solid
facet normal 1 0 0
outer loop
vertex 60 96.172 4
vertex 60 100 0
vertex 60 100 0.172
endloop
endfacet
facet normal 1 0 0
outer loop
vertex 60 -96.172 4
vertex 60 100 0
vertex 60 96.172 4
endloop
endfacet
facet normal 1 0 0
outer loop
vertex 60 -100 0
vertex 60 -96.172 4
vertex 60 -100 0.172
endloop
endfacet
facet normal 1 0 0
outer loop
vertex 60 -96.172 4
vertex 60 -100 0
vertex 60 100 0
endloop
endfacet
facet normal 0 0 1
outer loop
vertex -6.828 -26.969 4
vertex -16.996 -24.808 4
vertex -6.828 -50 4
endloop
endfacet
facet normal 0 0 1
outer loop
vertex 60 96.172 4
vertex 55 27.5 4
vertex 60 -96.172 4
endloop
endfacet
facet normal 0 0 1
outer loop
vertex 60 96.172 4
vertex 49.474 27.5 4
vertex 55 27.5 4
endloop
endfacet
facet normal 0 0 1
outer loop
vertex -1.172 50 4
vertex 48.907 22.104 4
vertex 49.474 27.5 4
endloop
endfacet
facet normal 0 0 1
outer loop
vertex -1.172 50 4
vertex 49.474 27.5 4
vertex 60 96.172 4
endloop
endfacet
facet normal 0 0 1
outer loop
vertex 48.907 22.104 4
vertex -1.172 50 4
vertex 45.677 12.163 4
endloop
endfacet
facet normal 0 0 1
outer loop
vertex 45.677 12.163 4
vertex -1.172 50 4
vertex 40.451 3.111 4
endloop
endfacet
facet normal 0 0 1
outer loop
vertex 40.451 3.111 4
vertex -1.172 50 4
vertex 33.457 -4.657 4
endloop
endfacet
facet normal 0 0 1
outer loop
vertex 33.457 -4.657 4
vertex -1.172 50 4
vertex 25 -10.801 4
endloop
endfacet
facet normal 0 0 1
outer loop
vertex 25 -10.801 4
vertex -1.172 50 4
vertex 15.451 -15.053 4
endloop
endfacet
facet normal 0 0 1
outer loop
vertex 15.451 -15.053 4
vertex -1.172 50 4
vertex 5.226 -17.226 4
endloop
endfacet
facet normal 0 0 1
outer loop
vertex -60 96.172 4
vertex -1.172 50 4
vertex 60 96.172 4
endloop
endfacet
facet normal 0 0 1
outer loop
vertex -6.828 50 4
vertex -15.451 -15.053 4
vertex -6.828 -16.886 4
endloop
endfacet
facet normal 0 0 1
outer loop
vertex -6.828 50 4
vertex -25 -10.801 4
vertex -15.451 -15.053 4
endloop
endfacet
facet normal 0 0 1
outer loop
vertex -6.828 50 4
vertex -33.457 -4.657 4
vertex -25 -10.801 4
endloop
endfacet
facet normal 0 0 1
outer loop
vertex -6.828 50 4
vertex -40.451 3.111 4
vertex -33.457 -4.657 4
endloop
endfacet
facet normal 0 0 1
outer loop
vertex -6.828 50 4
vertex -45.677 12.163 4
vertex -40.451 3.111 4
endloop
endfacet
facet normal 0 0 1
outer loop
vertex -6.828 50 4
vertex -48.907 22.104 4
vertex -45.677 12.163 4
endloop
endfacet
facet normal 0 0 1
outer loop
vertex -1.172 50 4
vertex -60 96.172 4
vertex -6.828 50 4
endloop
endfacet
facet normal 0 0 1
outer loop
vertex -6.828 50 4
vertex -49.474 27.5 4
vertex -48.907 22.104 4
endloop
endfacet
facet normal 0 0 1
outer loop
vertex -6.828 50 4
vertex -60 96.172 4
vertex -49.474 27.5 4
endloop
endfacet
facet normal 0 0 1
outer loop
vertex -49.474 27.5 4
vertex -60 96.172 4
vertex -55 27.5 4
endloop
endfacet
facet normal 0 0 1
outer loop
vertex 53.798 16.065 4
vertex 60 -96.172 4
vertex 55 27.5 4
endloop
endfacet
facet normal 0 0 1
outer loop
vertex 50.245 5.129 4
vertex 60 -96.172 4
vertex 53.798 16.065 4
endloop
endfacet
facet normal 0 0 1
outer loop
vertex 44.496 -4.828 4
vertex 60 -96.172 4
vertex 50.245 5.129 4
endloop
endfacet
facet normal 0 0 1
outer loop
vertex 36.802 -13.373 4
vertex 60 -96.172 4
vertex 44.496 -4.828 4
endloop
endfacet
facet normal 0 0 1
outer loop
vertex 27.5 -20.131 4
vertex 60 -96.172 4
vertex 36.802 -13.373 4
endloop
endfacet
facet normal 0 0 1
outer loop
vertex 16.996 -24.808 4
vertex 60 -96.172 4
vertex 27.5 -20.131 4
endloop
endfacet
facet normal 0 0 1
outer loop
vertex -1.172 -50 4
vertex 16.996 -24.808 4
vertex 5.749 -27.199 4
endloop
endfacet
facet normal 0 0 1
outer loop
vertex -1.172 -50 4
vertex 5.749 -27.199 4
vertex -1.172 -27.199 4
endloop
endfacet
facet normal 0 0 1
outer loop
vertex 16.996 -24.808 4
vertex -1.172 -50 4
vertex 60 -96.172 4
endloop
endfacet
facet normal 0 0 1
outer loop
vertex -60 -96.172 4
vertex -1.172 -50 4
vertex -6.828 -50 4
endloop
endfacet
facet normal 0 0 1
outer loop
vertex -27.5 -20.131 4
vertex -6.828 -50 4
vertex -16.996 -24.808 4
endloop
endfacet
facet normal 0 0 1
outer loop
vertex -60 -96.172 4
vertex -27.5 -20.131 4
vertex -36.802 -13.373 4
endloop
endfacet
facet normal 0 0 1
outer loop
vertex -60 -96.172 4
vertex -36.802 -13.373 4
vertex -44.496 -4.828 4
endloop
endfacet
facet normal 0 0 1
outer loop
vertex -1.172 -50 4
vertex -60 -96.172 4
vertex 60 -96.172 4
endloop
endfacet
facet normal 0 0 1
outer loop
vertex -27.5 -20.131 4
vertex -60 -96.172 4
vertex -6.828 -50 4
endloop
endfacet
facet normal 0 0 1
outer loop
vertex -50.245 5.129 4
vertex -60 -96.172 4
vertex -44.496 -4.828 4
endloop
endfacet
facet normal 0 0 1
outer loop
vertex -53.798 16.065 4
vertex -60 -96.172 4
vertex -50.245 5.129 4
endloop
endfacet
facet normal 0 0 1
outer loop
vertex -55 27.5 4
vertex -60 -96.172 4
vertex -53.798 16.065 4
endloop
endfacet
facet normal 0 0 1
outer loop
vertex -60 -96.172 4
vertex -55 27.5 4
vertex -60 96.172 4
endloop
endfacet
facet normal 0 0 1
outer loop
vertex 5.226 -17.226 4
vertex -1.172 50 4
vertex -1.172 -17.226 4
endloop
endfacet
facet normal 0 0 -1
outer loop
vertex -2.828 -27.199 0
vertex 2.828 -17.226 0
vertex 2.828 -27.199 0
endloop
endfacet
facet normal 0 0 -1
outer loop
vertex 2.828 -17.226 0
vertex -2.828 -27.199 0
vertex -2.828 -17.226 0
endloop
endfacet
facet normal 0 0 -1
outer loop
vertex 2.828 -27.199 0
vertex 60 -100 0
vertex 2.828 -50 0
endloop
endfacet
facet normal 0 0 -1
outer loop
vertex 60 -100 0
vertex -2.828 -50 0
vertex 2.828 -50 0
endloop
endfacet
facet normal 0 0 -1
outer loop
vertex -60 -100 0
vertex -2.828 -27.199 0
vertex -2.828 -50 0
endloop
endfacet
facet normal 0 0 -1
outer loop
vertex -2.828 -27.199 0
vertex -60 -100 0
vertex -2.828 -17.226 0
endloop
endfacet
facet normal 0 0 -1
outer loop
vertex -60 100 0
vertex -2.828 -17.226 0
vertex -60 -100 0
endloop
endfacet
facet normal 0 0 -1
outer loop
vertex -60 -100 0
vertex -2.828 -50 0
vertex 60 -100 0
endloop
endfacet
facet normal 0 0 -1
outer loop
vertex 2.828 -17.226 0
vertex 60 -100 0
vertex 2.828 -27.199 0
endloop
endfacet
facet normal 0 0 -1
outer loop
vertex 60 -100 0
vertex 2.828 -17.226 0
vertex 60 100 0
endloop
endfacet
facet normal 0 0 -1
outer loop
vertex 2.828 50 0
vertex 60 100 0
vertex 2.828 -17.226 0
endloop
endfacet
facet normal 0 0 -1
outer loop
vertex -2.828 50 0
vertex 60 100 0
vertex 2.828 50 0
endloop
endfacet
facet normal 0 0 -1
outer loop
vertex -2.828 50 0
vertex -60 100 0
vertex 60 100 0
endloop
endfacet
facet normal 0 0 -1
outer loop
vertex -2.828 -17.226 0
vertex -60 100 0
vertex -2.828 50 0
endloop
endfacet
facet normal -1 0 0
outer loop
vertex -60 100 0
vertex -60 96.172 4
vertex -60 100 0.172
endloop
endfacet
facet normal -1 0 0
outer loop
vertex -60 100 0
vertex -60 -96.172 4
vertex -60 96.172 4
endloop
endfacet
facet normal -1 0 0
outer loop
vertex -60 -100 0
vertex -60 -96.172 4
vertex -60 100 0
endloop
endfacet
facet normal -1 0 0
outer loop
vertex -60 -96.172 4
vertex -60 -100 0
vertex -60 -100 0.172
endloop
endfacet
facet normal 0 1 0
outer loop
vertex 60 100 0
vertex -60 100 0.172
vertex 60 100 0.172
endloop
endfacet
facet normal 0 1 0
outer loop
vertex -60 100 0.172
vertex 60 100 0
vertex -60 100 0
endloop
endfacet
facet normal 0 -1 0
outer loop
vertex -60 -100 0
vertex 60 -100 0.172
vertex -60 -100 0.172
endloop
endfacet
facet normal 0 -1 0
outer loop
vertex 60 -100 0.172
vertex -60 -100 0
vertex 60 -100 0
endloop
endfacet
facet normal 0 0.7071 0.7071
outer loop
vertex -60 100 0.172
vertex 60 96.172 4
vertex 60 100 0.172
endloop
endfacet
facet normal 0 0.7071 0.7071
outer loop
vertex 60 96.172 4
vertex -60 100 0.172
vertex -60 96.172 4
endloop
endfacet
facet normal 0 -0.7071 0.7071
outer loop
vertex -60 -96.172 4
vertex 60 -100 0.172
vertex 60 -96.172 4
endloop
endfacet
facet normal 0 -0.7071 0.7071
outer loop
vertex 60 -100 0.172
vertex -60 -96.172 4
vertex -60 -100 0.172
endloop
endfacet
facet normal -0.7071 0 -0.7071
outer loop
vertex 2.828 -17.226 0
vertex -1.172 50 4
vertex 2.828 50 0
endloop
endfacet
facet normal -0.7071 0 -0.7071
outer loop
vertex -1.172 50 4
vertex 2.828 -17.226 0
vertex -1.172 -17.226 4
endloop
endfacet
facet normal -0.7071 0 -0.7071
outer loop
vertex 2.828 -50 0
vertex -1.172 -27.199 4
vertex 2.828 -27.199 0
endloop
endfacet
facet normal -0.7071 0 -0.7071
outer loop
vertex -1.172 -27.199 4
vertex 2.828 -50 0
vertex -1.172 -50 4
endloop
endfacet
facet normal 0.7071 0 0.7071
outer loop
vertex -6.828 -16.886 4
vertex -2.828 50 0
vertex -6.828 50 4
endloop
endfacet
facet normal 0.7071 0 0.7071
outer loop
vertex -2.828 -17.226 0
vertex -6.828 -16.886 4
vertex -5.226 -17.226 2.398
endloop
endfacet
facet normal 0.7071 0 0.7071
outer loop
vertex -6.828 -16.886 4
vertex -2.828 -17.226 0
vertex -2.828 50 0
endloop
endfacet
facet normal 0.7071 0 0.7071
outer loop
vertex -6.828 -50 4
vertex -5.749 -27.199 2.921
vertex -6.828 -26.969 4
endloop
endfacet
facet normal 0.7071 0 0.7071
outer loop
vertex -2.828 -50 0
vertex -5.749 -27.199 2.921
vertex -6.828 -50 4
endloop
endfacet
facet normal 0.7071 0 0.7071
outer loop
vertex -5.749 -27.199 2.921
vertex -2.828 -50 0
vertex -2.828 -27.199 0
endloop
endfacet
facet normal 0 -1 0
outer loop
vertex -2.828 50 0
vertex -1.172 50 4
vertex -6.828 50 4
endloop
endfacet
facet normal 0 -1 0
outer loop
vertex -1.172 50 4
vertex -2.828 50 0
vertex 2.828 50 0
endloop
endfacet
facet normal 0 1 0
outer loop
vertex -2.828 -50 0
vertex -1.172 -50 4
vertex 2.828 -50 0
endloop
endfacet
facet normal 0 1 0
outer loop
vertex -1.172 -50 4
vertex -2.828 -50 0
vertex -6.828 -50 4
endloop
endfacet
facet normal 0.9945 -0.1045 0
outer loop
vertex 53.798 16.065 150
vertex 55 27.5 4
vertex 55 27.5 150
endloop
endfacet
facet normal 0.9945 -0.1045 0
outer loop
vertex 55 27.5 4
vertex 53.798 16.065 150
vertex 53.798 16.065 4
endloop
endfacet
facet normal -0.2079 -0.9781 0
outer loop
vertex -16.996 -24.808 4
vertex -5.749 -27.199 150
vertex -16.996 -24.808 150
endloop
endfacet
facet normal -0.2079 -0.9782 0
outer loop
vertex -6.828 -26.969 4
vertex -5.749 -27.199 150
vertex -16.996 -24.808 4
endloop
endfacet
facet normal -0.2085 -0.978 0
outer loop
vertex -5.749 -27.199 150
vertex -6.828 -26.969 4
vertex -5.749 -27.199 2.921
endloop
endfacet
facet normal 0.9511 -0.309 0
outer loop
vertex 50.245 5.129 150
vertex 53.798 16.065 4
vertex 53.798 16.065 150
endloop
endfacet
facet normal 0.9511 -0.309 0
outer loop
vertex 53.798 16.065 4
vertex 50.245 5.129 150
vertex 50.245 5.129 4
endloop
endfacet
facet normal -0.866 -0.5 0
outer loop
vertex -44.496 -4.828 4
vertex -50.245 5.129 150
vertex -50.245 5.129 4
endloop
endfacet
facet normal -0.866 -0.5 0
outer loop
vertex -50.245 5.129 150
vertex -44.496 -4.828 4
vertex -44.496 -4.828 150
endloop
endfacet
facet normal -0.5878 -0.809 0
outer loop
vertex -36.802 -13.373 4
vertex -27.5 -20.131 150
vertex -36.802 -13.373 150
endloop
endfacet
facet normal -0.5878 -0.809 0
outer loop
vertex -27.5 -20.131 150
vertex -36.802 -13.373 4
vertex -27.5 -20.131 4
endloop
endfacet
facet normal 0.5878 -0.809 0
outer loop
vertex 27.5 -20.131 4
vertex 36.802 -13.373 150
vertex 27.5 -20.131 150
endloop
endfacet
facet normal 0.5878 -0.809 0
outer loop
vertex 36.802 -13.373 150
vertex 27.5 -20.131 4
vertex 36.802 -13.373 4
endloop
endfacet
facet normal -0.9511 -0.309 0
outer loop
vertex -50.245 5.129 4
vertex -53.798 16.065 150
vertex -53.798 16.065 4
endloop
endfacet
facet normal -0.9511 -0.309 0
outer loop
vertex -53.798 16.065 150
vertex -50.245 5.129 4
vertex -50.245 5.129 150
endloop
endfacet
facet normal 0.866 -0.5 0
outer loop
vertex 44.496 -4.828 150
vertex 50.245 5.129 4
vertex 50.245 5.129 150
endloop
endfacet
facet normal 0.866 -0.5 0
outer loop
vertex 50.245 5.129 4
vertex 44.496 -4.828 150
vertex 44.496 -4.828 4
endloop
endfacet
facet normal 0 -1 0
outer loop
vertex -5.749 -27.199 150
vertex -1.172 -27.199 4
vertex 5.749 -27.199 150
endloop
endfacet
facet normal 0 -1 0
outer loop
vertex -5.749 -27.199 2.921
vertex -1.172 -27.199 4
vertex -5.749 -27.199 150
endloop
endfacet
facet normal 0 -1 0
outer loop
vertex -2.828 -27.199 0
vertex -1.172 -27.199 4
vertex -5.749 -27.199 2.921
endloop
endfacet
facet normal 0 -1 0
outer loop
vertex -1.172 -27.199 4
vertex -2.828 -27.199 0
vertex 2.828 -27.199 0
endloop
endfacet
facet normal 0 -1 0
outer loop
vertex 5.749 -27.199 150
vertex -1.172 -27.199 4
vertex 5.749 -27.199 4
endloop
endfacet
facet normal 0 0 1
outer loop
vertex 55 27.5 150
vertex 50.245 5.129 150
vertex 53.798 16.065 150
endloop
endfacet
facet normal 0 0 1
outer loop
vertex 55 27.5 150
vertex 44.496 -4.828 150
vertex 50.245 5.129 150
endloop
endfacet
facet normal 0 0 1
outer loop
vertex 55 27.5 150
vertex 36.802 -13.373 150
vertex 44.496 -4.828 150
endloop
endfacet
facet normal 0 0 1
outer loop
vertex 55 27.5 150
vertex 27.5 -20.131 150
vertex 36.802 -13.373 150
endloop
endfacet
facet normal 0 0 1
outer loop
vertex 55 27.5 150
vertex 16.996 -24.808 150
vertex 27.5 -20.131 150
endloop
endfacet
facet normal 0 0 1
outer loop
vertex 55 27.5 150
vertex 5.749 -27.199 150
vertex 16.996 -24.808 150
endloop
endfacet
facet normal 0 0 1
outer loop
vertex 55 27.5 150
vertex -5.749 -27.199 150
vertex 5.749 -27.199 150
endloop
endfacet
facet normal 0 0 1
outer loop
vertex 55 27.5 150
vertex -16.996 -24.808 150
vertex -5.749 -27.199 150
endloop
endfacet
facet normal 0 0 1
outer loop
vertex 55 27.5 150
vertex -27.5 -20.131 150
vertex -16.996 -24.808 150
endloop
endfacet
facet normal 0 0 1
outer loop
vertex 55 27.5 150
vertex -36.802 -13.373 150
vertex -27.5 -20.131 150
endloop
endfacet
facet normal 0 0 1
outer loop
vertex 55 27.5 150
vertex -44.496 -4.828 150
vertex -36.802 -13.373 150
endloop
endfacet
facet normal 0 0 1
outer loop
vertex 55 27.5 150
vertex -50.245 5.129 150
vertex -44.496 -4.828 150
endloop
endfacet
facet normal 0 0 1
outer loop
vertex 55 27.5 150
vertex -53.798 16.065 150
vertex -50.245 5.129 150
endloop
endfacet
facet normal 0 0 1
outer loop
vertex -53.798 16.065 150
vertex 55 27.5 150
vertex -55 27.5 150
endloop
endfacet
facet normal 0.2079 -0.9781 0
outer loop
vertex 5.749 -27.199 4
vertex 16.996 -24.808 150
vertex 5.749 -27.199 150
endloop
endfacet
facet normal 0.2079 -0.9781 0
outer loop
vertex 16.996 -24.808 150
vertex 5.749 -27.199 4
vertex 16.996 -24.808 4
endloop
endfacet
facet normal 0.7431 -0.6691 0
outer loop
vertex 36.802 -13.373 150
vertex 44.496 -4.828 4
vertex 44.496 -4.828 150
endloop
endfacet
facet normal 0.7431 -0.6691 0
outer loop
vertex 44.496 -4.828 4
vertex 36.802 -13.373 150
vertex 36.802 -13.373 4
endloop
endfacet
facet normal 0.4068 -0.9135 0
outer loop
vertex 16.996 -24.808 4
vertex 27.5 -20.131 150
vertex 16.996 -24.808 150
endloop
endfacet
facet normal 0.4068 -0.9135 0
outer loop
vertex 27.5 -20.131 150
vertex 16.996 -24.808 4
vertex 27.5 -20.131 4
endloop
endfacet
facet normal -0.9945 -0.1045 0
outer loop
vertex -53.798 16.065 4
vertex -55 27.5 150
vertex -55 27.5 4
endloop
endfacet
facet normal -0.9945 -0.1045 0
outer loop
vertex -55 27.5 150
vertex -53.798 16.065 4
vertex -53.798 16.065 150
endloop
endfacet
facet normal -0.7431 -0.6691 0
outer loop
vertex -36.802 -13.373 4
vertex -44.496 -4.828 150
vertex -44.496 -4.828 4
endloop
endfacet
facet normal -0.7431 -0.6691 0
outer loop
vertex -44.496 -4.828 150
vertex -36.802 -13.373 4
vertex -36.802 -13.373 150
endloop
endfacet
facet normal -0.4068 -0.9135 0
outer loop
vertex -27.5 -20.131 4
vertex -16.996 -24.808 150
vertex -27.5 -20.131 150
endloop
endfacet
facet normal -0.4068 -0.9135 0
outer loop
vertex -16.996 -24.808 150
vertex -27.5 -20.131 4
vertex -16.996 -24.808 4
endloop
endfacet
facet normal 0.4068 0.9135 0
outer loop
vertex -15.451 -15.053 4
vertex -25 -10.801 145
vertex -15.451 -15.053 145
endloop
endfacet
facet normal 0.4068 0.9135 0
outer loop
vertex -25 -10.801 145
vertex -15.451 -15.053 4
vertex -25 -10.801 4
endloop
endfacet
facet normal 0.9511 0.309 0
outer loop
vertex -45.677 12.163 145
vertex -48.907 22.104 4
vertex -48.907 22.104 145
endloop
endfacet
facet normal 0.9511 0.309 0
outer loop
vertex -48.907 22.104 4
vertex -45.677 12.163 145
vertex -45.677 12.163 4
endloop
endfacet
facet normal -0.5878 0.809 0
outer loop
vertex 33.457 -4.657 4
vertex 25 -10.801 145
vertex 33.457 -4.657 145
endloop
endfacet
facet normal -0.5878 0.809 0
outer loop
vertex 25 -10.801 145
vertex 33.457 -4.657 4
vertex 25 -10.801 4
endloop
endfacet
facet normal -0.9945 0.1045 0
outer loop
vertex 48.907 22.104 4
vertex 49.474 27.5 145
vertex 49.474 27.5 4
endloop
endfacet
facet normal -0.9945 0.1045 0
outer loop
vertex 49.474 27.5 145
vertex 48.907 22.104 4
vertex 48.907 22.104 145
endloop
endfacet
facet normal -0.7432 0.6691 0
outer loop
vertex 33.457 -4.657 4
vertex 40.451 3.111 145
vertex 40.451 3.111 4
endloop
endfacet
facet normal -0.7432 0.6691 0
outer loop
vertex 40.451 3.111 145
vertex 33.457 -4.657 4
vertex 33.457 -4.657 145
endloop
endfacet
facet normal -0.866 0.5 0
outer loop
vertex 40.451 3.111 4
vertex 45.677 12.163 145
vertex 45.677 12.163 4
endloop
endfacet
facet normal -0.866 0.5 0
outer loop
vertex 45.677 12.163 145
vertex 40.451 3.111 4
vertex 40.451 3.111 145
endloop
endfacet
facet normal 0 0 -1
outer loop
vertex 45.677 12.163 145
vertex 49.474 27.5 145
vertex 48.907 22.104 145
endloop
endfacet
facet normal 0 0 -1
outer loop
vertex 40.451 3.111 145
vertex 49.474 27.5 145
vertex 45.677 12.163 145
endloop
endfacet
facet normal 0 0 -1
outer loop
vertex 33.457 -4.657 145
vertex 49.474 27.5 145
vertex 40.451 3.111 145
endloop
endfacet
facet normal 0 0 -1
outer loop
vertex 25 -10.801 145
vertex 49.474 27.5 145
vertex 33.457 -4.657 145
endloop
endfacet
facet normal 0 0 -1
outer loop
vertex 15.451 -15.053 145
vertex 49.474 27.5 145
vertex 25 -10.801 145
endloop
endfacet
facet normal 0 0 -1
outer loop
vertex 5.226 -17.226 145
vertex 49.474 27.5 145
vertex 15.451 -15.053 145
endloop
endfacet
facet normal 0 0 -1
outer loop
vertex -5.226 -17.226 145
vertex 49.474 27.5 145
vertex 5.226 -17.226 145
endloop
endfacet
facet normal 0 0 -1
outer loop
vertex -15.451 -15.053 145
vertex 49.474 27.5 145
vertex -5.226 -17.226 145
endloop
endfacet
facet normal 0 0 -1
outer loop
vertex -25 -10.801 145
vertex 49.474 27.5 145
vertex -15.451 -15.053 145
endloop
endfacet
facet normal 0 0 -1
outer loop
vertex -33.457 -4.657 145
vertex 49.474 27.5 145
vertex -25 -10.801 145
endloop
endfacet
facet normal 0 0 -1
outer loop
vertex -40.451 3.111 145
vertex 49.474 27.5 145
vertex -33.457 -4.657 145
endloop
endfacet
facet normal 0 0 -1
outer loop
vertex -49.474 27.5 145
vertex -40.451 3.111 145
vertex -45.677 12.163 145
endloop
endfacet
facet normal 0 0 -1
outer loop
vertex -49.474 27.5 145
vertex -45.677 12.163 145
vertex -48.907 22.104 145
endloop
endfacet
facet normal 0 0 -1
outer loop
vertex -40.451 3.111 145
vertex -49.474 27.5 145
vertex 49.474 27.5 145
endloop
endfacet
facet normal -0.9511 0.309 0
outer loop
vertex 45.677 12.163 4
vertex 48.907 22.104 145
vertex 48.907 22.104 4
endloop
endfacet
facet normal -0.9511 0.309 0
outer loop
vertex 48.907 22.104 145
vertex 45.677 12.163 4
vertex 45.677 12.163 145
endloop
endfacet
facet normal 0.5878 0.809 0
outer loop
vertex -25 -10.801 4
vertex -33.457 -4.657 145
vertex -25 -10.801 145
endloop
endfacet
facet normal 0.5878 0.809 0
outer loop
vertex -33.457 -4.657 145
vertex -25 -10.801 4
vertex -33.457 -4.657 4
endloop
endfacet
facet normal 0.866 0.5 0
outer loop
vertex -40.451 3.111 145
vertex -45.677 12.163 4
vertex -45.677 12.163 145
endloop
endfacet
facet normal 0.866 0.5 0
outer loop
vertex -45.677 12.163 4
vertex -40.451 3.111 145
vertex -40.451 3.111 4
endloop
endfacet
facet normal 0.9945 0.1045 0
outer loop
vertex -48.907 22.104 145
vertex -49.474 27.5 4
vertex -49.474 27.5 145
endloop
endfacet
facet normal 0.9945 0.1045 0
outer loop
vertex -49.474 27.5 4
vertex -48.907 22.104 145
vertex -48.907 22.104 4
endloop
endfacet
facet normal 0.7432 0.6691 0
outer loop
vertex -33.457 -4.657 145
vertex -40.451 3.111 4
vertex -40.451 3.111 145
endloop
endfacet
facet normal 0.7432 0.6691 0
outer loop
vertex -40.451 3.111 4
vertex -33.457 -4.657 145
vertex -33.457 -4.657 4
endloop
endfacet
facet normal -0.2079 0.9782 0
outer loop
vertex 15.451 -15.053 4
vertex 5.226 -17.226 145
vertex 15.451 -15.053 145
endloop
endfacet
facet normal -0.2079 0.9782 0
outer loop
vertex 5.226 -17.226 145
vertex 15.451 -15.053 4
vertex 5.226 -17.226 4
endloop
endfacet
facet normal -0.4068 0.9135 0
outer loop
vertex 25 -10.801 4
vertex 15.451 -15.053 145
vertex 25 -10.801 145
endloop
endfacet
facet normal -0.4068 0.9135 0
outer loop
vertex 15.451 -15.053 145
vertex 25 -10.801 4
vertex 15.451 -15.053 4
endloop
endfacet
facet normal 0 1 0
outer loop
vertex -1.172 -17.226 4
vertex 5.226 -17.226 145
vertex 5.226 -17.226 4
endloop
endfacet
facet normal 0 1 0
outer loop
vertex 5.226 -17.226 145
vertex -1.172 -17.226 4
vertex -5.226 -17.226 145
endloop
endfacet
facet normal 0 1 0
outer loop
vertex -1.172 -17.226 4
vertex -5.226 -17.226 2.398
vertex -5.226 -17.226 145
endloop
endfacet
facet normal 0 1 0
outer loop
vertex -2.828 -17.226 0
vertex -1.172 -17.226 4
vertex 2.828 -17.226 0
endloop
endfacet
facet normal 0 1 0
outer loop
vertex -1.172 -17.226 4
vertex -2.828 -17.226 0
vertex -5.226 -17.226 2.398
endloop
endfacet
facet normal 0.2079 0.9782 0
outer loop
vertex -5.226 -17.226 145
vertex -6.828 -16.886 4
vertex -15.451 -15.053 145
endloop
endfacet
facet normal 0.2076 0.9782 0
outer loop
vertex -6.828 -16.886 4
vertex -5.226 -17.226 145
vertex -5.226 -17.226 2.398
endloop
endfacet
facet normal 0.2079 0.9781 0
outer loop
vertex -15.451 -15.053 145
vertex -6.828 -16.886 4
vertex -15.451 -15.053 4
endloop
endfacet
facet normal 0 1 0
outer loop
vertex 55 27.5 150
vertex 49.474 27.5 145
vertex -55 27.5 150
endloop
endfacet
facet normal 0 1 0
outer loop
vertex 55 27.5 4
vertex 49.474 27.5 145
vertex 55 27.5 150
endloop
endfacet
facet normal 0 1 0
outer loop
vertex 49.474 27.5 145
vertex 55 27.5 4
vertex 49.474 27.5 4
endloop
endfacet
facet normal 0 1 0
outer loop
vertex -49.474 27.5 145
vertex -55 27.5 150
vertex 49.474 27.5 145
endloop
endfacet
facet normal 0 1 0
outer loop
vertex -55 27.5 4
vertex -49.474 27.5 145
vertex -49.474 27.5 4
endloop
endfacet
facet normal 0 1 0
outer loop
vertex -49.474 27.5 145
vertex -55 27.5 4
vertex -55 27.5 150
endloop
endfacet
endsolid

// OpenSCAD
//Headphone Stand
//By Matthew Croft
//v.2 January 14,2019


//parameters-------------------------------------------------
cm=10;

//render-----------------------------------------------------
stand();

//modules----------------------------------------------------
module stand() {
//bottom
difference(){
translate([0,0,cm*0.2]) cube([cm*12,cm*20,cm*0.4], center=true);
//smoothing base
translate([0,cm*12.8,-cm*2.5]) rotate([-45,0,0]) cube([cm*14,cm*10,cm*0.4], center=true); 
translate([0,cm*-12.8,-cm*2.5]) rotate([45,0,0]) cube([cm*14,cm*10,cm*0.4], center=true); 
translate([0,0,0]) rotate([0,45,0]) cube([cm*14,cm*10,cm*0.4], center=true); 
}
//holder
translate([0,cm*11/4,0]) {
difference(){
translate([0,0,cm*7.5])cylinder(h=cm*15,d=cm*11,center=true);
translate([0,cm*.5,cm*7.5-cm])cylinder(h=cm*16,d=cm*10,center=true);
translate([0,cm*7.5,cm*7+0.45*cm-cm])cube([cm*14,cm*15,cm*20], center=true);

    


}
}
}
